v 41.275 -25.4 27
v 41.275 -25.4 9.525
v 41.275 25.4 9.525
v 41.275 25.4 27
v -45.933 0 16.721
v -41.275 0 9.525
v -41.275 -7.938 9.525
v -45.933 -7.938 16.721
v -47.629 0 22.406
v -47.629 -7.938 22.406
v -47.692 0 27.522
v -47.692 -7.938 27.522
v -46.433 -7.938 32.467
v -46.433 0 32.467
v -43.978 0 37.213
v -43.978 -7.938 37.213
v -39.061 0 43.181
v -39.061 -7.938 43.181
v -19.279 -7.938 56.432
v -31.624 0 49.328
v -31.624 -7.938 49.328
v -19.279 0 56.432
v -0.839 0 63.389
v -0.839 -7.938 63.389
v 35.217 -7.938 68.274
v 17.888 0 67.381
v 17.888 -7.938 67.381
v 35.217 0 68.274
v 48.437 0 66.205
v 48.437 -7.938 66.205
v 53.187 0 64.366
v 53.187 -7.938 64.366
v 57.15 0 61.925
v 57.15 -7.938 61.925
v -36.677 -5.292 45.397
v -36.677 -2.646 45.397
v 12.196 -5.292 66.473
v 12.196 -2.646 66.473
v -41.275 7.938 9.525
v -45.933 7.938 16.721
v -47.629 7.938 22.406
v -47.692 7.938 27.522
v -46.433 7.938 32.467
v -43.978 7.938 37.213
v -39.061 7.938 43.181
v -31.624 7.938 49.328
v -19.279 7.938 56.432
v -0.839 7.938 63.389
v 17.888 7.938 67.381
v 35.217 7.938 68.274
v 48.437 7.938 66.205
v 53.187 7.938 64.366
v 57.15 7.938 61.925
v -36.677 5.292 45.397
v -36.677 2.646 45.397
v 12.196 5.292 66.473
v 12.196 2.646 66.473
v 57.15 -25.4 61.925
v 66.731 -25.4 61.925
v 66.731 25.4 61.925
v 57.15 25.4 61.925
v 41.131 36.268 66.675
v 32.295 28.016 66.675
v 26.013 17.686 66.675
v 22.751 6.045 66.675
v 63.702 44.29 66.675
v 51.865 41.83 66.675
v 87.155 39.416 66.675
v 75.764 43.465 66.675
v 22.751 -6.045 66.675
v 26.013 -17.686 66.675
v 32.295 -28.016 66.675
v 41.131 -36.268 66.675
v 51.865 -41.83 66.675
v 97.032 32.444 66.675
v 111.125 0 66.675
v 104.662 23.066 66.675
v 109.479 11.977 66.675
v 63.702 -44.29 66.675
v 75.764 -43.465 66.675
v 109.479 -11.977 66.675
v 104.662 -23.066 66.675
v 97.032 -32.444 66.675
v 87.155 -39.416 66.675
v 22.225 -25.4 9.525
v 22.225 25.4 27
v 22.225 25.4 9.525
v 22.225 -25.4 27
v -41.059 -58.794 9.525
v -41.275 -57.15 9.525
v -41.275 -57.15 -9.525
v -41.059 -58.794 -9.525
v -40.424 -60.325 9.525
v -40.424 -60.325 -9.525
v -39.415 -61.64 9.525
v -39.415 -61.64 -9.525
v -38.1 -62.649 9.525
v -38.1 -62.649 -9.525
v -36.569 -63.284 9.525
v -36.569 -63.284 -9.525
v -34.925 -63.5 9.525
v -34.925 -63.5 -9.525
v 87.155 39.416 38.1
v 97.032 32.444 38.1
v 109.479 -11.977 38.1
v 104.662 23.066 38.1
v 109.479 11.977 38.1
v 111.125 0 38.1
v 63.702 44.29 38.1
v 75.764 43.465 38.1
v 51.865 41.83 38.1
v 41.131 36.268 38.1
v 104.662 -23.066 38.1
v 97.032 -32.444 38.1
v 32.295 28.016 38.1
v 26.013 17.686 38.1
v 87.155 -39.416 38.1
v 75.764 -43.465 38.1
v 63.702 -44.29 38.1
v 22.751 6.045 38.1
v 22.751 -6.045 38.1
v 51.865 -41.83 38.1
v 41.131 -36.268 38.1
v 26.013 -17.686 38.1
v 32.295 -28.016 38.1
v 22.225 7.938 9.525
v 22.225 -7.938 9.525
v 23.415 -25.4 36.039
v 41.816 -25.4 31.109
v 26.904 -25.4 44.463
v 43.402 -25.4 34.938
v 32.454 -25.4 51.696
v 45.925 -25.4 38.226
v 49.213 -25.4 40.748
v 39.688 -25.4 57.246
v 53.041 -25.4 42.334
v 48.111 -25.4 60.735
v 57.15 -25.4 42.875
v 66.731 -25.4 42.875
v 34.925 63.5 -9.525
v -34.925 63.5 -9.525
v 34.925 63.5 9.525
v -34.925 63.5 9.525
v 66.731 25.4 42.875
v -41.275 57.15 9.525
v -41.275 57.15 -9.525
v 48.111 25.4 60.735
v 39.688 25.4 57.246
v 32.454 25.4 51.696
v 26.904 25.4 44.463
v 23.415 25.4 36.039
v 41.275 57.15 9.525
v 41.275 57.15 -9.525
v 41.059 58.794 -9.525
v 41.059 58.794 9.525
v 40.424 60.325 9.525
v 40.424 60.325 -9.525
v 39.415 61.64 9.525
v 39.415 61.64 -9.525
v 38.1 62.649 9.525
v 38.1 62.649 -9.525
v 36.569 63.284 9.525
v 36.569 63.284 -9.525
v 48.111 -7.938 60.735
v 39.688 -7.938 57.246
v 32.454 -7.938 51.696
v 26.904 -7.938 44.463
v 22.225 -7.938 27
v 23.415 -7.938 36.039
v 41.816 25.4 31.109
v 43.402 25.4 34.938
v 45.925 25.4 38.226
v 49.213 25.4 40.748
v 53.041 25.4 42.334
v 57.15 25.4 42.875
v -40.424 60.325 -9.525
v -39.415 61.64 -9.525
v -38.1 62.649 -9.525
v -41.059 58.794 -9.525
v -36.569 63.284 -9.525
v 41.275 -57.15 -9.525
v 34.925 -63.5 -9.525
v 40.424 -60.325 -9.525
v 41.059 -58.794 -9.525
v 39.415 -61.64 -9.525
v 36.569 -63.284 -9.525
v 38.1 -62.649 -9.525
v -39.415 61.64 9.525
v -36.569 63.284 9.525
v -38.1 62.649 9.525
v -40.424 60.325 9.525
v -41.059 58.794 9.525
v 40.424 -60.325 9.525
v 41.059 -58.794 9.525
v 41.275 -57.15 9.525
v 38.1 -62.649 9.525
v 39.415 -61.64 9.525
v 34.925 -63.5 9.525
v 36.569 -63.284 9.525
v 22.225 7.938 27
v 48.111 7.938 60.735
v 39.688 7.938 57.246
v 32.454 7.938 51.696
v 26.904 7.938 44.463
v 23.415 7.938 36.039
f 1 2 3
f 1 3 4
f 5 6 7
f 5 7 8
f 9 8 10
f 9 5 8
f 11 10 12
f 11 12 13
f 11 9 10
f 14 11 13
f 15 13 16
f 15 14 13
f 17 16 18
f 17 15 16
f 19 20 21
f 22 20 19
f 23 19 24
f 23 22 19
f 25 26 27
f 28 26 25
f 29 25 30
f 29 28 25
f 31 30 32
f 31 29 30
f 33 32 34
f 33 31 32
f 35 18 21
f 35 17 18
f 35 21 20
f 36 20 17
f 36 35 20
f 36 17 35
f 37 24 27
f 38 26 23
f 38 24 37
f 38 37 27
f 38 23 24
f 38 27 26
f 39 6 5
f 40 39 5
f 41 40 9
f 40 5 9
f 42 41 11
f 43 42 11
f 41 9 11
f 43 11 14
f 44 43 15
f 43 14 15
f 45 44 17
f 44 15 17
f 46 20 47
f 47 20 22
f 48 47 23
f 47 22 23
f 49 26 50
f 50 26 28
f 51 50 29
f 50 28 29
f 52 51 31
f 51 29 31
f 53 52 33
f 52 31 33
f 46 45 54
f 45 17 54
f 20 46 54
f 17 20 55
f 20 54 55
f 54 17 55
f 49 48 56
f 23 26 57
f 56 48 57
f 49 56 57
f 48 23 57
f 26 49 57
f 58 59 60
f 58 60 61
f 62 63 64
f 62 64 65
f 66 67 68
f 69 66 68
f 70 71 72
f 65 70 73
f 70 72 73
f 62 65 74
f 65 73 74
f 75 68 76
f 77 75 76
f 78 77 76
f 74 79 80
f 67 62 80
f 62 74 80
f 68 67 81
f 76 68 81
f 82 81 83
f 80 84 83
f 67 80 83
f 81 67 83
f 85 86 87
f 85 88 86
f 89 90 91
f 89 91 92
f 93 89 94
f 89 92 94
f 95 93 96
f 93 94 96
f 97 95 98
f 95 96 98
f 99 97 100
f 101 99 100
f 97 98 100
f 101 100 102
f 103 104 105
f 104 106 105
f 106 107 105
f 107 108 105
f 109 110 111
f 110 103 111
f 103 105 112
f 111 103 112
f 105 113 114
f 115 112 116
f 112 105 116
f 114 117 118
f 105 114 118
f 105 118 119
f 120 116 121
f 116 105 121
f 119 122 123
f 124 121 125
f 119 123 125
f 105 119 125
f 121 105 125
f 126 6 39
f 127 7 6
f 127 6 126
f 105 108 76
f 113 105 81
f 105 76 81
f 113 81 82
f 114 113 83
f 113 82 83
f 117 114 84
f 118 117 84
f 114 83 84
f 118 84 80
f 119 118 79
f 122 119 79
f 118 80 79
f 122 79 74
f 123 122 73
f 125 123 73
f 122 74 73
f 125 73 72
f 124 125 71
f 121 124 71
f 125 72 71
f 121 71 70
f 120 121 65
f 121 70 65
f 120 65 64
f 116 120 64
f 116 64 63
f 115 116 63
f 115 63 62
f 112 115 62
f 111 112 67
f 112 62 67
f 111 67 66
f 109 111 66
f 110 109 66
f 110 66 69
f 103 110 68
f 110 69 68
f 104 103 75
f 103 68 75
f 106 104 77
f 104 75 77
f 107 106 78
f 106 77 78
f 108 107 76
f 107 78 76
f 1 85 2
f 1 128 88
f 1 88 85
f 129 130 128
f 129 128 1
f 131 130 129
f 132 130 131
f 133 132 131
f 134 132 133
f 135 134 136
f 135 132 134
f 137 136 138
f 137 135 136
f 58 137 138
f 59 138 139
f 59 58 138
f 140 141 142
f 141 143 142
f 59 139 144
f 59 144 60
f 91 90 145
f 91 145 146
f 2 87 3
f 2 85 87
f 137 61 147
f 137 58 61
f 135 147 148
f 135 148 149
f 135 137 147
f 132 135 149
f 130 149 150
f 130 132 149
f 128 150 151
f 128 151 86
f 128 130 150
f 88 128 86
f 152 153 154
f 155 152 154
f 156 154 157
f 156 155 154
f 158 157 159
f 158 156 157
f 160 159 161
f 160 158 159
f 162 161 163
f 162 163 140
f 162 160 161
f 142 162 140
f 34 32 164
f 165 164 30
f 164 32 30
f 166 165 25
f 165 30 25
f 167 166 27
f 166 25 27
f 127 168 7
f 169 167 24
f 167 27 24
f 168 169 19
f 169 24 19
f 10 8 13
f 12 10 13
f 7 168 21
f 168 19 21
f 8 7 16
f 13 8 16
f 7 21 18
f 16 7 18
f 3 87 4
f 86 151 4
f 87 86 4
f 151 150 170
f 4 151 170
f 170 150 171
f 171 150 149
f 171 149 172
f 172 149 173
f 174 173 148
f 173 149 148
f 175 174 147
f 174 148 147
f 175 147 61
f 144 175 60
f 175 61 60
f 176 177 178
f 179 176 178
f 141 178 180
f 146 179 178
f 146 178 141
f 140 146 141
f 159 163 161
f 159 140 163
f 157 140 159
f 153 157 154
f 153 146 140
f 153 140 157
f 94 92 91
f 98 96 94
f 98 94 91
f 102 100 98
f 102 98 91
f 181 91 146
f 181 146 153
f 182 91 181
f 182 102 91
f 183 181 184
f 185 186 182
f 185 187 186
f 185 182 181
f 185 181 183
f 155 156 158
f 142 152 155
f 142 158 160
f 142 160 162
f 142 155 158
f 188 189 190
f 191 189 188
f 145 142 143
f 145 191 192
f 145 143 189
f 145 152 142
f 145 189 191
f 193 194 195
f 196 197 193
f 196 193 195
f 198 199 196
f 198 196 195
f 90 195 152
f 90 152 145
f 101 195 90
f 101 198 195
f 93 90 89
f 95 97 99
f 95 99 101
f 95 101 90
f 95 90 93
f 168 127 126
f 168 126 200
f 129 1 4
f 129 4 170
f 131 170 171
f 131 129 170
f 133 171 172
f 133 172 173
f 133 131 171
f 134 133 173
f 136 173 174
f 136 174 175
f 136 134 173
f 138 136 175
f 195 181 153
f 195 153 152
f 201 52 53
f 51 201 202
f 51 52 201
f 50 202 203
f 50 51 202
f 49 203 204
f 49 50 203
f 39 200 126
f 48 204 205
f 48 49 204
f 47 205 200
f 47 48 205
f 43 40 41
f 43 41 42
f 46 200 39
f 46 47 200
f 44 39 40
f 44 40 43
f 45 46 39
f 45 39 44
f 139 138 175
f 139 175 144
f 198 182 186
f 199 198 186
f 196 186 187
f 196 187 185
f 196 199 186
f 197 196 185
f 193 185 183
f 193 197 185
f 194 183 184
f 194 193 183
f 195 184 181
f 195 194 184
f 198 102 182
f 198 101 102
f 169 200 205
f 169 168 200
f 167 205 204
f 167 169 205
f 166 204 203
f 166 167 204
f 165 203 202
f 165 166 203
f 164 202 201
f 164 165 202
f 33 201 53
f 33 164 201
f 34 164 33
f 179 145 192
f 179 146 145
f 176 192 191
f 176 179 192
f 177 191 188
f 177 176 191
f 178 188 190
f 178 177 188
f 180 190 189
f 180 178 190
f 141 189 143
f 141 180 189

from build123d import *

# Parameters (mm, degrees)
F1_DEPTH = 63.5
F0_W     = 6.4064434166
F0_H     = 19.05
F2_DEPTH = 25.4
F3_DEPTH = 7.9375
F5_R     = 6.35


with BuildPart() as f1:
    # F0 (on Front) → F1 (new body, symmetric)
    with BuildSketch(Plane.XZ):
        Polygon((-41.275, -9.525), (41.275, -9.525), (41.275, 9.525), (22.225, 9.525), (-41.275, 9.525), align=None)
    extrude(amount=F1_DEPTH, both=True)

    # F5
    f5_edges = [f1.edges().sort_by_distance(p)[0] for p in [
        (-41.275, -63.5, 0),
        (41.275, -63.5, 0),
        (41.275, 63.5, 0),
        (-41.275, 63.5, 0),
    ]]
    fillet(f5_edges, radius=F5_R)


with BuildPart() as f2:
    # F0 (on Front) → F2 (new body, symmetric)
    with BuildSketch(Plane.XZ):
        with BuildLine():
            Line((22.225, 9.525), (41.275, 9.525))
            Line((41.275, 9.525), (41.275, 27.0002))
            ThreePointArc((41.275, 27.0002), (45.9246798487, 38.2255201513), (57.15, 42.8752))
            Line((57.15, 42.8752), (60.325, 42.8752))
            Line((60.325, 42.8752), (60.325, 61.9252))
            Line((60.325, 61.9252), (57.15, 61.9252))
            ThreePointArc((57.15, 61.9252), (32.4542956671, 51.6959043329), (22.225, 27.0002))
            Line((22.225, 27.0002), (22.225, 9.525))
        make_face()
        with Locations((63.5282217083, 52.4002)):
            Rectangle(F0_W, F0_H)
    extrude(amount=F2_DEPTH, both=True)


with BuildPart() as f3:
    # F0 (on Front) → F3 (new body, symmetric)
    with BuildSketch(Plane.XZ):
        with BuildLine():
            add(Edge.make_bspline(
                [(-41.275, 9.525), (-74.8795121908, 49.18442294), (30.2203726023, 82.8957036138), (57.15, 61.9252)],
                knots=[0, 0, 0, 0, 111.5045361635, 111.5045361635, 111.5045361635, 111.5045361635], degree=3))
            Line((-41.275, 9.525), (22.225, 9.525))
            Line((22.225, 9.525), (22.225, 27.0002))
            ThreePointArc((22.225, 27.0002), (32.4542956671, 51.6959043329), (57.15, 61.9252))
        make_face()
    extrude(amount=F3_DEPTH, both=True)


with BuildPart() as f4:
    # F0 (on Front) → F4 (revolve)
    with BuildSketch(Plane.XZ):
        Polygon((66.7314434166, 66.675), (66.7314434166, 61.9252), (66.7314434166, 42.8752), (66.7314434166, 38.1), (111.125, 38.1), (111.125, 66.675), align=None)
    revolve(axis=Axis((66.7314434166, 0, 52.3875), (0, 0, -1)))


solid = Compound([f1.part, f2.part, f3.part, f4.part])
